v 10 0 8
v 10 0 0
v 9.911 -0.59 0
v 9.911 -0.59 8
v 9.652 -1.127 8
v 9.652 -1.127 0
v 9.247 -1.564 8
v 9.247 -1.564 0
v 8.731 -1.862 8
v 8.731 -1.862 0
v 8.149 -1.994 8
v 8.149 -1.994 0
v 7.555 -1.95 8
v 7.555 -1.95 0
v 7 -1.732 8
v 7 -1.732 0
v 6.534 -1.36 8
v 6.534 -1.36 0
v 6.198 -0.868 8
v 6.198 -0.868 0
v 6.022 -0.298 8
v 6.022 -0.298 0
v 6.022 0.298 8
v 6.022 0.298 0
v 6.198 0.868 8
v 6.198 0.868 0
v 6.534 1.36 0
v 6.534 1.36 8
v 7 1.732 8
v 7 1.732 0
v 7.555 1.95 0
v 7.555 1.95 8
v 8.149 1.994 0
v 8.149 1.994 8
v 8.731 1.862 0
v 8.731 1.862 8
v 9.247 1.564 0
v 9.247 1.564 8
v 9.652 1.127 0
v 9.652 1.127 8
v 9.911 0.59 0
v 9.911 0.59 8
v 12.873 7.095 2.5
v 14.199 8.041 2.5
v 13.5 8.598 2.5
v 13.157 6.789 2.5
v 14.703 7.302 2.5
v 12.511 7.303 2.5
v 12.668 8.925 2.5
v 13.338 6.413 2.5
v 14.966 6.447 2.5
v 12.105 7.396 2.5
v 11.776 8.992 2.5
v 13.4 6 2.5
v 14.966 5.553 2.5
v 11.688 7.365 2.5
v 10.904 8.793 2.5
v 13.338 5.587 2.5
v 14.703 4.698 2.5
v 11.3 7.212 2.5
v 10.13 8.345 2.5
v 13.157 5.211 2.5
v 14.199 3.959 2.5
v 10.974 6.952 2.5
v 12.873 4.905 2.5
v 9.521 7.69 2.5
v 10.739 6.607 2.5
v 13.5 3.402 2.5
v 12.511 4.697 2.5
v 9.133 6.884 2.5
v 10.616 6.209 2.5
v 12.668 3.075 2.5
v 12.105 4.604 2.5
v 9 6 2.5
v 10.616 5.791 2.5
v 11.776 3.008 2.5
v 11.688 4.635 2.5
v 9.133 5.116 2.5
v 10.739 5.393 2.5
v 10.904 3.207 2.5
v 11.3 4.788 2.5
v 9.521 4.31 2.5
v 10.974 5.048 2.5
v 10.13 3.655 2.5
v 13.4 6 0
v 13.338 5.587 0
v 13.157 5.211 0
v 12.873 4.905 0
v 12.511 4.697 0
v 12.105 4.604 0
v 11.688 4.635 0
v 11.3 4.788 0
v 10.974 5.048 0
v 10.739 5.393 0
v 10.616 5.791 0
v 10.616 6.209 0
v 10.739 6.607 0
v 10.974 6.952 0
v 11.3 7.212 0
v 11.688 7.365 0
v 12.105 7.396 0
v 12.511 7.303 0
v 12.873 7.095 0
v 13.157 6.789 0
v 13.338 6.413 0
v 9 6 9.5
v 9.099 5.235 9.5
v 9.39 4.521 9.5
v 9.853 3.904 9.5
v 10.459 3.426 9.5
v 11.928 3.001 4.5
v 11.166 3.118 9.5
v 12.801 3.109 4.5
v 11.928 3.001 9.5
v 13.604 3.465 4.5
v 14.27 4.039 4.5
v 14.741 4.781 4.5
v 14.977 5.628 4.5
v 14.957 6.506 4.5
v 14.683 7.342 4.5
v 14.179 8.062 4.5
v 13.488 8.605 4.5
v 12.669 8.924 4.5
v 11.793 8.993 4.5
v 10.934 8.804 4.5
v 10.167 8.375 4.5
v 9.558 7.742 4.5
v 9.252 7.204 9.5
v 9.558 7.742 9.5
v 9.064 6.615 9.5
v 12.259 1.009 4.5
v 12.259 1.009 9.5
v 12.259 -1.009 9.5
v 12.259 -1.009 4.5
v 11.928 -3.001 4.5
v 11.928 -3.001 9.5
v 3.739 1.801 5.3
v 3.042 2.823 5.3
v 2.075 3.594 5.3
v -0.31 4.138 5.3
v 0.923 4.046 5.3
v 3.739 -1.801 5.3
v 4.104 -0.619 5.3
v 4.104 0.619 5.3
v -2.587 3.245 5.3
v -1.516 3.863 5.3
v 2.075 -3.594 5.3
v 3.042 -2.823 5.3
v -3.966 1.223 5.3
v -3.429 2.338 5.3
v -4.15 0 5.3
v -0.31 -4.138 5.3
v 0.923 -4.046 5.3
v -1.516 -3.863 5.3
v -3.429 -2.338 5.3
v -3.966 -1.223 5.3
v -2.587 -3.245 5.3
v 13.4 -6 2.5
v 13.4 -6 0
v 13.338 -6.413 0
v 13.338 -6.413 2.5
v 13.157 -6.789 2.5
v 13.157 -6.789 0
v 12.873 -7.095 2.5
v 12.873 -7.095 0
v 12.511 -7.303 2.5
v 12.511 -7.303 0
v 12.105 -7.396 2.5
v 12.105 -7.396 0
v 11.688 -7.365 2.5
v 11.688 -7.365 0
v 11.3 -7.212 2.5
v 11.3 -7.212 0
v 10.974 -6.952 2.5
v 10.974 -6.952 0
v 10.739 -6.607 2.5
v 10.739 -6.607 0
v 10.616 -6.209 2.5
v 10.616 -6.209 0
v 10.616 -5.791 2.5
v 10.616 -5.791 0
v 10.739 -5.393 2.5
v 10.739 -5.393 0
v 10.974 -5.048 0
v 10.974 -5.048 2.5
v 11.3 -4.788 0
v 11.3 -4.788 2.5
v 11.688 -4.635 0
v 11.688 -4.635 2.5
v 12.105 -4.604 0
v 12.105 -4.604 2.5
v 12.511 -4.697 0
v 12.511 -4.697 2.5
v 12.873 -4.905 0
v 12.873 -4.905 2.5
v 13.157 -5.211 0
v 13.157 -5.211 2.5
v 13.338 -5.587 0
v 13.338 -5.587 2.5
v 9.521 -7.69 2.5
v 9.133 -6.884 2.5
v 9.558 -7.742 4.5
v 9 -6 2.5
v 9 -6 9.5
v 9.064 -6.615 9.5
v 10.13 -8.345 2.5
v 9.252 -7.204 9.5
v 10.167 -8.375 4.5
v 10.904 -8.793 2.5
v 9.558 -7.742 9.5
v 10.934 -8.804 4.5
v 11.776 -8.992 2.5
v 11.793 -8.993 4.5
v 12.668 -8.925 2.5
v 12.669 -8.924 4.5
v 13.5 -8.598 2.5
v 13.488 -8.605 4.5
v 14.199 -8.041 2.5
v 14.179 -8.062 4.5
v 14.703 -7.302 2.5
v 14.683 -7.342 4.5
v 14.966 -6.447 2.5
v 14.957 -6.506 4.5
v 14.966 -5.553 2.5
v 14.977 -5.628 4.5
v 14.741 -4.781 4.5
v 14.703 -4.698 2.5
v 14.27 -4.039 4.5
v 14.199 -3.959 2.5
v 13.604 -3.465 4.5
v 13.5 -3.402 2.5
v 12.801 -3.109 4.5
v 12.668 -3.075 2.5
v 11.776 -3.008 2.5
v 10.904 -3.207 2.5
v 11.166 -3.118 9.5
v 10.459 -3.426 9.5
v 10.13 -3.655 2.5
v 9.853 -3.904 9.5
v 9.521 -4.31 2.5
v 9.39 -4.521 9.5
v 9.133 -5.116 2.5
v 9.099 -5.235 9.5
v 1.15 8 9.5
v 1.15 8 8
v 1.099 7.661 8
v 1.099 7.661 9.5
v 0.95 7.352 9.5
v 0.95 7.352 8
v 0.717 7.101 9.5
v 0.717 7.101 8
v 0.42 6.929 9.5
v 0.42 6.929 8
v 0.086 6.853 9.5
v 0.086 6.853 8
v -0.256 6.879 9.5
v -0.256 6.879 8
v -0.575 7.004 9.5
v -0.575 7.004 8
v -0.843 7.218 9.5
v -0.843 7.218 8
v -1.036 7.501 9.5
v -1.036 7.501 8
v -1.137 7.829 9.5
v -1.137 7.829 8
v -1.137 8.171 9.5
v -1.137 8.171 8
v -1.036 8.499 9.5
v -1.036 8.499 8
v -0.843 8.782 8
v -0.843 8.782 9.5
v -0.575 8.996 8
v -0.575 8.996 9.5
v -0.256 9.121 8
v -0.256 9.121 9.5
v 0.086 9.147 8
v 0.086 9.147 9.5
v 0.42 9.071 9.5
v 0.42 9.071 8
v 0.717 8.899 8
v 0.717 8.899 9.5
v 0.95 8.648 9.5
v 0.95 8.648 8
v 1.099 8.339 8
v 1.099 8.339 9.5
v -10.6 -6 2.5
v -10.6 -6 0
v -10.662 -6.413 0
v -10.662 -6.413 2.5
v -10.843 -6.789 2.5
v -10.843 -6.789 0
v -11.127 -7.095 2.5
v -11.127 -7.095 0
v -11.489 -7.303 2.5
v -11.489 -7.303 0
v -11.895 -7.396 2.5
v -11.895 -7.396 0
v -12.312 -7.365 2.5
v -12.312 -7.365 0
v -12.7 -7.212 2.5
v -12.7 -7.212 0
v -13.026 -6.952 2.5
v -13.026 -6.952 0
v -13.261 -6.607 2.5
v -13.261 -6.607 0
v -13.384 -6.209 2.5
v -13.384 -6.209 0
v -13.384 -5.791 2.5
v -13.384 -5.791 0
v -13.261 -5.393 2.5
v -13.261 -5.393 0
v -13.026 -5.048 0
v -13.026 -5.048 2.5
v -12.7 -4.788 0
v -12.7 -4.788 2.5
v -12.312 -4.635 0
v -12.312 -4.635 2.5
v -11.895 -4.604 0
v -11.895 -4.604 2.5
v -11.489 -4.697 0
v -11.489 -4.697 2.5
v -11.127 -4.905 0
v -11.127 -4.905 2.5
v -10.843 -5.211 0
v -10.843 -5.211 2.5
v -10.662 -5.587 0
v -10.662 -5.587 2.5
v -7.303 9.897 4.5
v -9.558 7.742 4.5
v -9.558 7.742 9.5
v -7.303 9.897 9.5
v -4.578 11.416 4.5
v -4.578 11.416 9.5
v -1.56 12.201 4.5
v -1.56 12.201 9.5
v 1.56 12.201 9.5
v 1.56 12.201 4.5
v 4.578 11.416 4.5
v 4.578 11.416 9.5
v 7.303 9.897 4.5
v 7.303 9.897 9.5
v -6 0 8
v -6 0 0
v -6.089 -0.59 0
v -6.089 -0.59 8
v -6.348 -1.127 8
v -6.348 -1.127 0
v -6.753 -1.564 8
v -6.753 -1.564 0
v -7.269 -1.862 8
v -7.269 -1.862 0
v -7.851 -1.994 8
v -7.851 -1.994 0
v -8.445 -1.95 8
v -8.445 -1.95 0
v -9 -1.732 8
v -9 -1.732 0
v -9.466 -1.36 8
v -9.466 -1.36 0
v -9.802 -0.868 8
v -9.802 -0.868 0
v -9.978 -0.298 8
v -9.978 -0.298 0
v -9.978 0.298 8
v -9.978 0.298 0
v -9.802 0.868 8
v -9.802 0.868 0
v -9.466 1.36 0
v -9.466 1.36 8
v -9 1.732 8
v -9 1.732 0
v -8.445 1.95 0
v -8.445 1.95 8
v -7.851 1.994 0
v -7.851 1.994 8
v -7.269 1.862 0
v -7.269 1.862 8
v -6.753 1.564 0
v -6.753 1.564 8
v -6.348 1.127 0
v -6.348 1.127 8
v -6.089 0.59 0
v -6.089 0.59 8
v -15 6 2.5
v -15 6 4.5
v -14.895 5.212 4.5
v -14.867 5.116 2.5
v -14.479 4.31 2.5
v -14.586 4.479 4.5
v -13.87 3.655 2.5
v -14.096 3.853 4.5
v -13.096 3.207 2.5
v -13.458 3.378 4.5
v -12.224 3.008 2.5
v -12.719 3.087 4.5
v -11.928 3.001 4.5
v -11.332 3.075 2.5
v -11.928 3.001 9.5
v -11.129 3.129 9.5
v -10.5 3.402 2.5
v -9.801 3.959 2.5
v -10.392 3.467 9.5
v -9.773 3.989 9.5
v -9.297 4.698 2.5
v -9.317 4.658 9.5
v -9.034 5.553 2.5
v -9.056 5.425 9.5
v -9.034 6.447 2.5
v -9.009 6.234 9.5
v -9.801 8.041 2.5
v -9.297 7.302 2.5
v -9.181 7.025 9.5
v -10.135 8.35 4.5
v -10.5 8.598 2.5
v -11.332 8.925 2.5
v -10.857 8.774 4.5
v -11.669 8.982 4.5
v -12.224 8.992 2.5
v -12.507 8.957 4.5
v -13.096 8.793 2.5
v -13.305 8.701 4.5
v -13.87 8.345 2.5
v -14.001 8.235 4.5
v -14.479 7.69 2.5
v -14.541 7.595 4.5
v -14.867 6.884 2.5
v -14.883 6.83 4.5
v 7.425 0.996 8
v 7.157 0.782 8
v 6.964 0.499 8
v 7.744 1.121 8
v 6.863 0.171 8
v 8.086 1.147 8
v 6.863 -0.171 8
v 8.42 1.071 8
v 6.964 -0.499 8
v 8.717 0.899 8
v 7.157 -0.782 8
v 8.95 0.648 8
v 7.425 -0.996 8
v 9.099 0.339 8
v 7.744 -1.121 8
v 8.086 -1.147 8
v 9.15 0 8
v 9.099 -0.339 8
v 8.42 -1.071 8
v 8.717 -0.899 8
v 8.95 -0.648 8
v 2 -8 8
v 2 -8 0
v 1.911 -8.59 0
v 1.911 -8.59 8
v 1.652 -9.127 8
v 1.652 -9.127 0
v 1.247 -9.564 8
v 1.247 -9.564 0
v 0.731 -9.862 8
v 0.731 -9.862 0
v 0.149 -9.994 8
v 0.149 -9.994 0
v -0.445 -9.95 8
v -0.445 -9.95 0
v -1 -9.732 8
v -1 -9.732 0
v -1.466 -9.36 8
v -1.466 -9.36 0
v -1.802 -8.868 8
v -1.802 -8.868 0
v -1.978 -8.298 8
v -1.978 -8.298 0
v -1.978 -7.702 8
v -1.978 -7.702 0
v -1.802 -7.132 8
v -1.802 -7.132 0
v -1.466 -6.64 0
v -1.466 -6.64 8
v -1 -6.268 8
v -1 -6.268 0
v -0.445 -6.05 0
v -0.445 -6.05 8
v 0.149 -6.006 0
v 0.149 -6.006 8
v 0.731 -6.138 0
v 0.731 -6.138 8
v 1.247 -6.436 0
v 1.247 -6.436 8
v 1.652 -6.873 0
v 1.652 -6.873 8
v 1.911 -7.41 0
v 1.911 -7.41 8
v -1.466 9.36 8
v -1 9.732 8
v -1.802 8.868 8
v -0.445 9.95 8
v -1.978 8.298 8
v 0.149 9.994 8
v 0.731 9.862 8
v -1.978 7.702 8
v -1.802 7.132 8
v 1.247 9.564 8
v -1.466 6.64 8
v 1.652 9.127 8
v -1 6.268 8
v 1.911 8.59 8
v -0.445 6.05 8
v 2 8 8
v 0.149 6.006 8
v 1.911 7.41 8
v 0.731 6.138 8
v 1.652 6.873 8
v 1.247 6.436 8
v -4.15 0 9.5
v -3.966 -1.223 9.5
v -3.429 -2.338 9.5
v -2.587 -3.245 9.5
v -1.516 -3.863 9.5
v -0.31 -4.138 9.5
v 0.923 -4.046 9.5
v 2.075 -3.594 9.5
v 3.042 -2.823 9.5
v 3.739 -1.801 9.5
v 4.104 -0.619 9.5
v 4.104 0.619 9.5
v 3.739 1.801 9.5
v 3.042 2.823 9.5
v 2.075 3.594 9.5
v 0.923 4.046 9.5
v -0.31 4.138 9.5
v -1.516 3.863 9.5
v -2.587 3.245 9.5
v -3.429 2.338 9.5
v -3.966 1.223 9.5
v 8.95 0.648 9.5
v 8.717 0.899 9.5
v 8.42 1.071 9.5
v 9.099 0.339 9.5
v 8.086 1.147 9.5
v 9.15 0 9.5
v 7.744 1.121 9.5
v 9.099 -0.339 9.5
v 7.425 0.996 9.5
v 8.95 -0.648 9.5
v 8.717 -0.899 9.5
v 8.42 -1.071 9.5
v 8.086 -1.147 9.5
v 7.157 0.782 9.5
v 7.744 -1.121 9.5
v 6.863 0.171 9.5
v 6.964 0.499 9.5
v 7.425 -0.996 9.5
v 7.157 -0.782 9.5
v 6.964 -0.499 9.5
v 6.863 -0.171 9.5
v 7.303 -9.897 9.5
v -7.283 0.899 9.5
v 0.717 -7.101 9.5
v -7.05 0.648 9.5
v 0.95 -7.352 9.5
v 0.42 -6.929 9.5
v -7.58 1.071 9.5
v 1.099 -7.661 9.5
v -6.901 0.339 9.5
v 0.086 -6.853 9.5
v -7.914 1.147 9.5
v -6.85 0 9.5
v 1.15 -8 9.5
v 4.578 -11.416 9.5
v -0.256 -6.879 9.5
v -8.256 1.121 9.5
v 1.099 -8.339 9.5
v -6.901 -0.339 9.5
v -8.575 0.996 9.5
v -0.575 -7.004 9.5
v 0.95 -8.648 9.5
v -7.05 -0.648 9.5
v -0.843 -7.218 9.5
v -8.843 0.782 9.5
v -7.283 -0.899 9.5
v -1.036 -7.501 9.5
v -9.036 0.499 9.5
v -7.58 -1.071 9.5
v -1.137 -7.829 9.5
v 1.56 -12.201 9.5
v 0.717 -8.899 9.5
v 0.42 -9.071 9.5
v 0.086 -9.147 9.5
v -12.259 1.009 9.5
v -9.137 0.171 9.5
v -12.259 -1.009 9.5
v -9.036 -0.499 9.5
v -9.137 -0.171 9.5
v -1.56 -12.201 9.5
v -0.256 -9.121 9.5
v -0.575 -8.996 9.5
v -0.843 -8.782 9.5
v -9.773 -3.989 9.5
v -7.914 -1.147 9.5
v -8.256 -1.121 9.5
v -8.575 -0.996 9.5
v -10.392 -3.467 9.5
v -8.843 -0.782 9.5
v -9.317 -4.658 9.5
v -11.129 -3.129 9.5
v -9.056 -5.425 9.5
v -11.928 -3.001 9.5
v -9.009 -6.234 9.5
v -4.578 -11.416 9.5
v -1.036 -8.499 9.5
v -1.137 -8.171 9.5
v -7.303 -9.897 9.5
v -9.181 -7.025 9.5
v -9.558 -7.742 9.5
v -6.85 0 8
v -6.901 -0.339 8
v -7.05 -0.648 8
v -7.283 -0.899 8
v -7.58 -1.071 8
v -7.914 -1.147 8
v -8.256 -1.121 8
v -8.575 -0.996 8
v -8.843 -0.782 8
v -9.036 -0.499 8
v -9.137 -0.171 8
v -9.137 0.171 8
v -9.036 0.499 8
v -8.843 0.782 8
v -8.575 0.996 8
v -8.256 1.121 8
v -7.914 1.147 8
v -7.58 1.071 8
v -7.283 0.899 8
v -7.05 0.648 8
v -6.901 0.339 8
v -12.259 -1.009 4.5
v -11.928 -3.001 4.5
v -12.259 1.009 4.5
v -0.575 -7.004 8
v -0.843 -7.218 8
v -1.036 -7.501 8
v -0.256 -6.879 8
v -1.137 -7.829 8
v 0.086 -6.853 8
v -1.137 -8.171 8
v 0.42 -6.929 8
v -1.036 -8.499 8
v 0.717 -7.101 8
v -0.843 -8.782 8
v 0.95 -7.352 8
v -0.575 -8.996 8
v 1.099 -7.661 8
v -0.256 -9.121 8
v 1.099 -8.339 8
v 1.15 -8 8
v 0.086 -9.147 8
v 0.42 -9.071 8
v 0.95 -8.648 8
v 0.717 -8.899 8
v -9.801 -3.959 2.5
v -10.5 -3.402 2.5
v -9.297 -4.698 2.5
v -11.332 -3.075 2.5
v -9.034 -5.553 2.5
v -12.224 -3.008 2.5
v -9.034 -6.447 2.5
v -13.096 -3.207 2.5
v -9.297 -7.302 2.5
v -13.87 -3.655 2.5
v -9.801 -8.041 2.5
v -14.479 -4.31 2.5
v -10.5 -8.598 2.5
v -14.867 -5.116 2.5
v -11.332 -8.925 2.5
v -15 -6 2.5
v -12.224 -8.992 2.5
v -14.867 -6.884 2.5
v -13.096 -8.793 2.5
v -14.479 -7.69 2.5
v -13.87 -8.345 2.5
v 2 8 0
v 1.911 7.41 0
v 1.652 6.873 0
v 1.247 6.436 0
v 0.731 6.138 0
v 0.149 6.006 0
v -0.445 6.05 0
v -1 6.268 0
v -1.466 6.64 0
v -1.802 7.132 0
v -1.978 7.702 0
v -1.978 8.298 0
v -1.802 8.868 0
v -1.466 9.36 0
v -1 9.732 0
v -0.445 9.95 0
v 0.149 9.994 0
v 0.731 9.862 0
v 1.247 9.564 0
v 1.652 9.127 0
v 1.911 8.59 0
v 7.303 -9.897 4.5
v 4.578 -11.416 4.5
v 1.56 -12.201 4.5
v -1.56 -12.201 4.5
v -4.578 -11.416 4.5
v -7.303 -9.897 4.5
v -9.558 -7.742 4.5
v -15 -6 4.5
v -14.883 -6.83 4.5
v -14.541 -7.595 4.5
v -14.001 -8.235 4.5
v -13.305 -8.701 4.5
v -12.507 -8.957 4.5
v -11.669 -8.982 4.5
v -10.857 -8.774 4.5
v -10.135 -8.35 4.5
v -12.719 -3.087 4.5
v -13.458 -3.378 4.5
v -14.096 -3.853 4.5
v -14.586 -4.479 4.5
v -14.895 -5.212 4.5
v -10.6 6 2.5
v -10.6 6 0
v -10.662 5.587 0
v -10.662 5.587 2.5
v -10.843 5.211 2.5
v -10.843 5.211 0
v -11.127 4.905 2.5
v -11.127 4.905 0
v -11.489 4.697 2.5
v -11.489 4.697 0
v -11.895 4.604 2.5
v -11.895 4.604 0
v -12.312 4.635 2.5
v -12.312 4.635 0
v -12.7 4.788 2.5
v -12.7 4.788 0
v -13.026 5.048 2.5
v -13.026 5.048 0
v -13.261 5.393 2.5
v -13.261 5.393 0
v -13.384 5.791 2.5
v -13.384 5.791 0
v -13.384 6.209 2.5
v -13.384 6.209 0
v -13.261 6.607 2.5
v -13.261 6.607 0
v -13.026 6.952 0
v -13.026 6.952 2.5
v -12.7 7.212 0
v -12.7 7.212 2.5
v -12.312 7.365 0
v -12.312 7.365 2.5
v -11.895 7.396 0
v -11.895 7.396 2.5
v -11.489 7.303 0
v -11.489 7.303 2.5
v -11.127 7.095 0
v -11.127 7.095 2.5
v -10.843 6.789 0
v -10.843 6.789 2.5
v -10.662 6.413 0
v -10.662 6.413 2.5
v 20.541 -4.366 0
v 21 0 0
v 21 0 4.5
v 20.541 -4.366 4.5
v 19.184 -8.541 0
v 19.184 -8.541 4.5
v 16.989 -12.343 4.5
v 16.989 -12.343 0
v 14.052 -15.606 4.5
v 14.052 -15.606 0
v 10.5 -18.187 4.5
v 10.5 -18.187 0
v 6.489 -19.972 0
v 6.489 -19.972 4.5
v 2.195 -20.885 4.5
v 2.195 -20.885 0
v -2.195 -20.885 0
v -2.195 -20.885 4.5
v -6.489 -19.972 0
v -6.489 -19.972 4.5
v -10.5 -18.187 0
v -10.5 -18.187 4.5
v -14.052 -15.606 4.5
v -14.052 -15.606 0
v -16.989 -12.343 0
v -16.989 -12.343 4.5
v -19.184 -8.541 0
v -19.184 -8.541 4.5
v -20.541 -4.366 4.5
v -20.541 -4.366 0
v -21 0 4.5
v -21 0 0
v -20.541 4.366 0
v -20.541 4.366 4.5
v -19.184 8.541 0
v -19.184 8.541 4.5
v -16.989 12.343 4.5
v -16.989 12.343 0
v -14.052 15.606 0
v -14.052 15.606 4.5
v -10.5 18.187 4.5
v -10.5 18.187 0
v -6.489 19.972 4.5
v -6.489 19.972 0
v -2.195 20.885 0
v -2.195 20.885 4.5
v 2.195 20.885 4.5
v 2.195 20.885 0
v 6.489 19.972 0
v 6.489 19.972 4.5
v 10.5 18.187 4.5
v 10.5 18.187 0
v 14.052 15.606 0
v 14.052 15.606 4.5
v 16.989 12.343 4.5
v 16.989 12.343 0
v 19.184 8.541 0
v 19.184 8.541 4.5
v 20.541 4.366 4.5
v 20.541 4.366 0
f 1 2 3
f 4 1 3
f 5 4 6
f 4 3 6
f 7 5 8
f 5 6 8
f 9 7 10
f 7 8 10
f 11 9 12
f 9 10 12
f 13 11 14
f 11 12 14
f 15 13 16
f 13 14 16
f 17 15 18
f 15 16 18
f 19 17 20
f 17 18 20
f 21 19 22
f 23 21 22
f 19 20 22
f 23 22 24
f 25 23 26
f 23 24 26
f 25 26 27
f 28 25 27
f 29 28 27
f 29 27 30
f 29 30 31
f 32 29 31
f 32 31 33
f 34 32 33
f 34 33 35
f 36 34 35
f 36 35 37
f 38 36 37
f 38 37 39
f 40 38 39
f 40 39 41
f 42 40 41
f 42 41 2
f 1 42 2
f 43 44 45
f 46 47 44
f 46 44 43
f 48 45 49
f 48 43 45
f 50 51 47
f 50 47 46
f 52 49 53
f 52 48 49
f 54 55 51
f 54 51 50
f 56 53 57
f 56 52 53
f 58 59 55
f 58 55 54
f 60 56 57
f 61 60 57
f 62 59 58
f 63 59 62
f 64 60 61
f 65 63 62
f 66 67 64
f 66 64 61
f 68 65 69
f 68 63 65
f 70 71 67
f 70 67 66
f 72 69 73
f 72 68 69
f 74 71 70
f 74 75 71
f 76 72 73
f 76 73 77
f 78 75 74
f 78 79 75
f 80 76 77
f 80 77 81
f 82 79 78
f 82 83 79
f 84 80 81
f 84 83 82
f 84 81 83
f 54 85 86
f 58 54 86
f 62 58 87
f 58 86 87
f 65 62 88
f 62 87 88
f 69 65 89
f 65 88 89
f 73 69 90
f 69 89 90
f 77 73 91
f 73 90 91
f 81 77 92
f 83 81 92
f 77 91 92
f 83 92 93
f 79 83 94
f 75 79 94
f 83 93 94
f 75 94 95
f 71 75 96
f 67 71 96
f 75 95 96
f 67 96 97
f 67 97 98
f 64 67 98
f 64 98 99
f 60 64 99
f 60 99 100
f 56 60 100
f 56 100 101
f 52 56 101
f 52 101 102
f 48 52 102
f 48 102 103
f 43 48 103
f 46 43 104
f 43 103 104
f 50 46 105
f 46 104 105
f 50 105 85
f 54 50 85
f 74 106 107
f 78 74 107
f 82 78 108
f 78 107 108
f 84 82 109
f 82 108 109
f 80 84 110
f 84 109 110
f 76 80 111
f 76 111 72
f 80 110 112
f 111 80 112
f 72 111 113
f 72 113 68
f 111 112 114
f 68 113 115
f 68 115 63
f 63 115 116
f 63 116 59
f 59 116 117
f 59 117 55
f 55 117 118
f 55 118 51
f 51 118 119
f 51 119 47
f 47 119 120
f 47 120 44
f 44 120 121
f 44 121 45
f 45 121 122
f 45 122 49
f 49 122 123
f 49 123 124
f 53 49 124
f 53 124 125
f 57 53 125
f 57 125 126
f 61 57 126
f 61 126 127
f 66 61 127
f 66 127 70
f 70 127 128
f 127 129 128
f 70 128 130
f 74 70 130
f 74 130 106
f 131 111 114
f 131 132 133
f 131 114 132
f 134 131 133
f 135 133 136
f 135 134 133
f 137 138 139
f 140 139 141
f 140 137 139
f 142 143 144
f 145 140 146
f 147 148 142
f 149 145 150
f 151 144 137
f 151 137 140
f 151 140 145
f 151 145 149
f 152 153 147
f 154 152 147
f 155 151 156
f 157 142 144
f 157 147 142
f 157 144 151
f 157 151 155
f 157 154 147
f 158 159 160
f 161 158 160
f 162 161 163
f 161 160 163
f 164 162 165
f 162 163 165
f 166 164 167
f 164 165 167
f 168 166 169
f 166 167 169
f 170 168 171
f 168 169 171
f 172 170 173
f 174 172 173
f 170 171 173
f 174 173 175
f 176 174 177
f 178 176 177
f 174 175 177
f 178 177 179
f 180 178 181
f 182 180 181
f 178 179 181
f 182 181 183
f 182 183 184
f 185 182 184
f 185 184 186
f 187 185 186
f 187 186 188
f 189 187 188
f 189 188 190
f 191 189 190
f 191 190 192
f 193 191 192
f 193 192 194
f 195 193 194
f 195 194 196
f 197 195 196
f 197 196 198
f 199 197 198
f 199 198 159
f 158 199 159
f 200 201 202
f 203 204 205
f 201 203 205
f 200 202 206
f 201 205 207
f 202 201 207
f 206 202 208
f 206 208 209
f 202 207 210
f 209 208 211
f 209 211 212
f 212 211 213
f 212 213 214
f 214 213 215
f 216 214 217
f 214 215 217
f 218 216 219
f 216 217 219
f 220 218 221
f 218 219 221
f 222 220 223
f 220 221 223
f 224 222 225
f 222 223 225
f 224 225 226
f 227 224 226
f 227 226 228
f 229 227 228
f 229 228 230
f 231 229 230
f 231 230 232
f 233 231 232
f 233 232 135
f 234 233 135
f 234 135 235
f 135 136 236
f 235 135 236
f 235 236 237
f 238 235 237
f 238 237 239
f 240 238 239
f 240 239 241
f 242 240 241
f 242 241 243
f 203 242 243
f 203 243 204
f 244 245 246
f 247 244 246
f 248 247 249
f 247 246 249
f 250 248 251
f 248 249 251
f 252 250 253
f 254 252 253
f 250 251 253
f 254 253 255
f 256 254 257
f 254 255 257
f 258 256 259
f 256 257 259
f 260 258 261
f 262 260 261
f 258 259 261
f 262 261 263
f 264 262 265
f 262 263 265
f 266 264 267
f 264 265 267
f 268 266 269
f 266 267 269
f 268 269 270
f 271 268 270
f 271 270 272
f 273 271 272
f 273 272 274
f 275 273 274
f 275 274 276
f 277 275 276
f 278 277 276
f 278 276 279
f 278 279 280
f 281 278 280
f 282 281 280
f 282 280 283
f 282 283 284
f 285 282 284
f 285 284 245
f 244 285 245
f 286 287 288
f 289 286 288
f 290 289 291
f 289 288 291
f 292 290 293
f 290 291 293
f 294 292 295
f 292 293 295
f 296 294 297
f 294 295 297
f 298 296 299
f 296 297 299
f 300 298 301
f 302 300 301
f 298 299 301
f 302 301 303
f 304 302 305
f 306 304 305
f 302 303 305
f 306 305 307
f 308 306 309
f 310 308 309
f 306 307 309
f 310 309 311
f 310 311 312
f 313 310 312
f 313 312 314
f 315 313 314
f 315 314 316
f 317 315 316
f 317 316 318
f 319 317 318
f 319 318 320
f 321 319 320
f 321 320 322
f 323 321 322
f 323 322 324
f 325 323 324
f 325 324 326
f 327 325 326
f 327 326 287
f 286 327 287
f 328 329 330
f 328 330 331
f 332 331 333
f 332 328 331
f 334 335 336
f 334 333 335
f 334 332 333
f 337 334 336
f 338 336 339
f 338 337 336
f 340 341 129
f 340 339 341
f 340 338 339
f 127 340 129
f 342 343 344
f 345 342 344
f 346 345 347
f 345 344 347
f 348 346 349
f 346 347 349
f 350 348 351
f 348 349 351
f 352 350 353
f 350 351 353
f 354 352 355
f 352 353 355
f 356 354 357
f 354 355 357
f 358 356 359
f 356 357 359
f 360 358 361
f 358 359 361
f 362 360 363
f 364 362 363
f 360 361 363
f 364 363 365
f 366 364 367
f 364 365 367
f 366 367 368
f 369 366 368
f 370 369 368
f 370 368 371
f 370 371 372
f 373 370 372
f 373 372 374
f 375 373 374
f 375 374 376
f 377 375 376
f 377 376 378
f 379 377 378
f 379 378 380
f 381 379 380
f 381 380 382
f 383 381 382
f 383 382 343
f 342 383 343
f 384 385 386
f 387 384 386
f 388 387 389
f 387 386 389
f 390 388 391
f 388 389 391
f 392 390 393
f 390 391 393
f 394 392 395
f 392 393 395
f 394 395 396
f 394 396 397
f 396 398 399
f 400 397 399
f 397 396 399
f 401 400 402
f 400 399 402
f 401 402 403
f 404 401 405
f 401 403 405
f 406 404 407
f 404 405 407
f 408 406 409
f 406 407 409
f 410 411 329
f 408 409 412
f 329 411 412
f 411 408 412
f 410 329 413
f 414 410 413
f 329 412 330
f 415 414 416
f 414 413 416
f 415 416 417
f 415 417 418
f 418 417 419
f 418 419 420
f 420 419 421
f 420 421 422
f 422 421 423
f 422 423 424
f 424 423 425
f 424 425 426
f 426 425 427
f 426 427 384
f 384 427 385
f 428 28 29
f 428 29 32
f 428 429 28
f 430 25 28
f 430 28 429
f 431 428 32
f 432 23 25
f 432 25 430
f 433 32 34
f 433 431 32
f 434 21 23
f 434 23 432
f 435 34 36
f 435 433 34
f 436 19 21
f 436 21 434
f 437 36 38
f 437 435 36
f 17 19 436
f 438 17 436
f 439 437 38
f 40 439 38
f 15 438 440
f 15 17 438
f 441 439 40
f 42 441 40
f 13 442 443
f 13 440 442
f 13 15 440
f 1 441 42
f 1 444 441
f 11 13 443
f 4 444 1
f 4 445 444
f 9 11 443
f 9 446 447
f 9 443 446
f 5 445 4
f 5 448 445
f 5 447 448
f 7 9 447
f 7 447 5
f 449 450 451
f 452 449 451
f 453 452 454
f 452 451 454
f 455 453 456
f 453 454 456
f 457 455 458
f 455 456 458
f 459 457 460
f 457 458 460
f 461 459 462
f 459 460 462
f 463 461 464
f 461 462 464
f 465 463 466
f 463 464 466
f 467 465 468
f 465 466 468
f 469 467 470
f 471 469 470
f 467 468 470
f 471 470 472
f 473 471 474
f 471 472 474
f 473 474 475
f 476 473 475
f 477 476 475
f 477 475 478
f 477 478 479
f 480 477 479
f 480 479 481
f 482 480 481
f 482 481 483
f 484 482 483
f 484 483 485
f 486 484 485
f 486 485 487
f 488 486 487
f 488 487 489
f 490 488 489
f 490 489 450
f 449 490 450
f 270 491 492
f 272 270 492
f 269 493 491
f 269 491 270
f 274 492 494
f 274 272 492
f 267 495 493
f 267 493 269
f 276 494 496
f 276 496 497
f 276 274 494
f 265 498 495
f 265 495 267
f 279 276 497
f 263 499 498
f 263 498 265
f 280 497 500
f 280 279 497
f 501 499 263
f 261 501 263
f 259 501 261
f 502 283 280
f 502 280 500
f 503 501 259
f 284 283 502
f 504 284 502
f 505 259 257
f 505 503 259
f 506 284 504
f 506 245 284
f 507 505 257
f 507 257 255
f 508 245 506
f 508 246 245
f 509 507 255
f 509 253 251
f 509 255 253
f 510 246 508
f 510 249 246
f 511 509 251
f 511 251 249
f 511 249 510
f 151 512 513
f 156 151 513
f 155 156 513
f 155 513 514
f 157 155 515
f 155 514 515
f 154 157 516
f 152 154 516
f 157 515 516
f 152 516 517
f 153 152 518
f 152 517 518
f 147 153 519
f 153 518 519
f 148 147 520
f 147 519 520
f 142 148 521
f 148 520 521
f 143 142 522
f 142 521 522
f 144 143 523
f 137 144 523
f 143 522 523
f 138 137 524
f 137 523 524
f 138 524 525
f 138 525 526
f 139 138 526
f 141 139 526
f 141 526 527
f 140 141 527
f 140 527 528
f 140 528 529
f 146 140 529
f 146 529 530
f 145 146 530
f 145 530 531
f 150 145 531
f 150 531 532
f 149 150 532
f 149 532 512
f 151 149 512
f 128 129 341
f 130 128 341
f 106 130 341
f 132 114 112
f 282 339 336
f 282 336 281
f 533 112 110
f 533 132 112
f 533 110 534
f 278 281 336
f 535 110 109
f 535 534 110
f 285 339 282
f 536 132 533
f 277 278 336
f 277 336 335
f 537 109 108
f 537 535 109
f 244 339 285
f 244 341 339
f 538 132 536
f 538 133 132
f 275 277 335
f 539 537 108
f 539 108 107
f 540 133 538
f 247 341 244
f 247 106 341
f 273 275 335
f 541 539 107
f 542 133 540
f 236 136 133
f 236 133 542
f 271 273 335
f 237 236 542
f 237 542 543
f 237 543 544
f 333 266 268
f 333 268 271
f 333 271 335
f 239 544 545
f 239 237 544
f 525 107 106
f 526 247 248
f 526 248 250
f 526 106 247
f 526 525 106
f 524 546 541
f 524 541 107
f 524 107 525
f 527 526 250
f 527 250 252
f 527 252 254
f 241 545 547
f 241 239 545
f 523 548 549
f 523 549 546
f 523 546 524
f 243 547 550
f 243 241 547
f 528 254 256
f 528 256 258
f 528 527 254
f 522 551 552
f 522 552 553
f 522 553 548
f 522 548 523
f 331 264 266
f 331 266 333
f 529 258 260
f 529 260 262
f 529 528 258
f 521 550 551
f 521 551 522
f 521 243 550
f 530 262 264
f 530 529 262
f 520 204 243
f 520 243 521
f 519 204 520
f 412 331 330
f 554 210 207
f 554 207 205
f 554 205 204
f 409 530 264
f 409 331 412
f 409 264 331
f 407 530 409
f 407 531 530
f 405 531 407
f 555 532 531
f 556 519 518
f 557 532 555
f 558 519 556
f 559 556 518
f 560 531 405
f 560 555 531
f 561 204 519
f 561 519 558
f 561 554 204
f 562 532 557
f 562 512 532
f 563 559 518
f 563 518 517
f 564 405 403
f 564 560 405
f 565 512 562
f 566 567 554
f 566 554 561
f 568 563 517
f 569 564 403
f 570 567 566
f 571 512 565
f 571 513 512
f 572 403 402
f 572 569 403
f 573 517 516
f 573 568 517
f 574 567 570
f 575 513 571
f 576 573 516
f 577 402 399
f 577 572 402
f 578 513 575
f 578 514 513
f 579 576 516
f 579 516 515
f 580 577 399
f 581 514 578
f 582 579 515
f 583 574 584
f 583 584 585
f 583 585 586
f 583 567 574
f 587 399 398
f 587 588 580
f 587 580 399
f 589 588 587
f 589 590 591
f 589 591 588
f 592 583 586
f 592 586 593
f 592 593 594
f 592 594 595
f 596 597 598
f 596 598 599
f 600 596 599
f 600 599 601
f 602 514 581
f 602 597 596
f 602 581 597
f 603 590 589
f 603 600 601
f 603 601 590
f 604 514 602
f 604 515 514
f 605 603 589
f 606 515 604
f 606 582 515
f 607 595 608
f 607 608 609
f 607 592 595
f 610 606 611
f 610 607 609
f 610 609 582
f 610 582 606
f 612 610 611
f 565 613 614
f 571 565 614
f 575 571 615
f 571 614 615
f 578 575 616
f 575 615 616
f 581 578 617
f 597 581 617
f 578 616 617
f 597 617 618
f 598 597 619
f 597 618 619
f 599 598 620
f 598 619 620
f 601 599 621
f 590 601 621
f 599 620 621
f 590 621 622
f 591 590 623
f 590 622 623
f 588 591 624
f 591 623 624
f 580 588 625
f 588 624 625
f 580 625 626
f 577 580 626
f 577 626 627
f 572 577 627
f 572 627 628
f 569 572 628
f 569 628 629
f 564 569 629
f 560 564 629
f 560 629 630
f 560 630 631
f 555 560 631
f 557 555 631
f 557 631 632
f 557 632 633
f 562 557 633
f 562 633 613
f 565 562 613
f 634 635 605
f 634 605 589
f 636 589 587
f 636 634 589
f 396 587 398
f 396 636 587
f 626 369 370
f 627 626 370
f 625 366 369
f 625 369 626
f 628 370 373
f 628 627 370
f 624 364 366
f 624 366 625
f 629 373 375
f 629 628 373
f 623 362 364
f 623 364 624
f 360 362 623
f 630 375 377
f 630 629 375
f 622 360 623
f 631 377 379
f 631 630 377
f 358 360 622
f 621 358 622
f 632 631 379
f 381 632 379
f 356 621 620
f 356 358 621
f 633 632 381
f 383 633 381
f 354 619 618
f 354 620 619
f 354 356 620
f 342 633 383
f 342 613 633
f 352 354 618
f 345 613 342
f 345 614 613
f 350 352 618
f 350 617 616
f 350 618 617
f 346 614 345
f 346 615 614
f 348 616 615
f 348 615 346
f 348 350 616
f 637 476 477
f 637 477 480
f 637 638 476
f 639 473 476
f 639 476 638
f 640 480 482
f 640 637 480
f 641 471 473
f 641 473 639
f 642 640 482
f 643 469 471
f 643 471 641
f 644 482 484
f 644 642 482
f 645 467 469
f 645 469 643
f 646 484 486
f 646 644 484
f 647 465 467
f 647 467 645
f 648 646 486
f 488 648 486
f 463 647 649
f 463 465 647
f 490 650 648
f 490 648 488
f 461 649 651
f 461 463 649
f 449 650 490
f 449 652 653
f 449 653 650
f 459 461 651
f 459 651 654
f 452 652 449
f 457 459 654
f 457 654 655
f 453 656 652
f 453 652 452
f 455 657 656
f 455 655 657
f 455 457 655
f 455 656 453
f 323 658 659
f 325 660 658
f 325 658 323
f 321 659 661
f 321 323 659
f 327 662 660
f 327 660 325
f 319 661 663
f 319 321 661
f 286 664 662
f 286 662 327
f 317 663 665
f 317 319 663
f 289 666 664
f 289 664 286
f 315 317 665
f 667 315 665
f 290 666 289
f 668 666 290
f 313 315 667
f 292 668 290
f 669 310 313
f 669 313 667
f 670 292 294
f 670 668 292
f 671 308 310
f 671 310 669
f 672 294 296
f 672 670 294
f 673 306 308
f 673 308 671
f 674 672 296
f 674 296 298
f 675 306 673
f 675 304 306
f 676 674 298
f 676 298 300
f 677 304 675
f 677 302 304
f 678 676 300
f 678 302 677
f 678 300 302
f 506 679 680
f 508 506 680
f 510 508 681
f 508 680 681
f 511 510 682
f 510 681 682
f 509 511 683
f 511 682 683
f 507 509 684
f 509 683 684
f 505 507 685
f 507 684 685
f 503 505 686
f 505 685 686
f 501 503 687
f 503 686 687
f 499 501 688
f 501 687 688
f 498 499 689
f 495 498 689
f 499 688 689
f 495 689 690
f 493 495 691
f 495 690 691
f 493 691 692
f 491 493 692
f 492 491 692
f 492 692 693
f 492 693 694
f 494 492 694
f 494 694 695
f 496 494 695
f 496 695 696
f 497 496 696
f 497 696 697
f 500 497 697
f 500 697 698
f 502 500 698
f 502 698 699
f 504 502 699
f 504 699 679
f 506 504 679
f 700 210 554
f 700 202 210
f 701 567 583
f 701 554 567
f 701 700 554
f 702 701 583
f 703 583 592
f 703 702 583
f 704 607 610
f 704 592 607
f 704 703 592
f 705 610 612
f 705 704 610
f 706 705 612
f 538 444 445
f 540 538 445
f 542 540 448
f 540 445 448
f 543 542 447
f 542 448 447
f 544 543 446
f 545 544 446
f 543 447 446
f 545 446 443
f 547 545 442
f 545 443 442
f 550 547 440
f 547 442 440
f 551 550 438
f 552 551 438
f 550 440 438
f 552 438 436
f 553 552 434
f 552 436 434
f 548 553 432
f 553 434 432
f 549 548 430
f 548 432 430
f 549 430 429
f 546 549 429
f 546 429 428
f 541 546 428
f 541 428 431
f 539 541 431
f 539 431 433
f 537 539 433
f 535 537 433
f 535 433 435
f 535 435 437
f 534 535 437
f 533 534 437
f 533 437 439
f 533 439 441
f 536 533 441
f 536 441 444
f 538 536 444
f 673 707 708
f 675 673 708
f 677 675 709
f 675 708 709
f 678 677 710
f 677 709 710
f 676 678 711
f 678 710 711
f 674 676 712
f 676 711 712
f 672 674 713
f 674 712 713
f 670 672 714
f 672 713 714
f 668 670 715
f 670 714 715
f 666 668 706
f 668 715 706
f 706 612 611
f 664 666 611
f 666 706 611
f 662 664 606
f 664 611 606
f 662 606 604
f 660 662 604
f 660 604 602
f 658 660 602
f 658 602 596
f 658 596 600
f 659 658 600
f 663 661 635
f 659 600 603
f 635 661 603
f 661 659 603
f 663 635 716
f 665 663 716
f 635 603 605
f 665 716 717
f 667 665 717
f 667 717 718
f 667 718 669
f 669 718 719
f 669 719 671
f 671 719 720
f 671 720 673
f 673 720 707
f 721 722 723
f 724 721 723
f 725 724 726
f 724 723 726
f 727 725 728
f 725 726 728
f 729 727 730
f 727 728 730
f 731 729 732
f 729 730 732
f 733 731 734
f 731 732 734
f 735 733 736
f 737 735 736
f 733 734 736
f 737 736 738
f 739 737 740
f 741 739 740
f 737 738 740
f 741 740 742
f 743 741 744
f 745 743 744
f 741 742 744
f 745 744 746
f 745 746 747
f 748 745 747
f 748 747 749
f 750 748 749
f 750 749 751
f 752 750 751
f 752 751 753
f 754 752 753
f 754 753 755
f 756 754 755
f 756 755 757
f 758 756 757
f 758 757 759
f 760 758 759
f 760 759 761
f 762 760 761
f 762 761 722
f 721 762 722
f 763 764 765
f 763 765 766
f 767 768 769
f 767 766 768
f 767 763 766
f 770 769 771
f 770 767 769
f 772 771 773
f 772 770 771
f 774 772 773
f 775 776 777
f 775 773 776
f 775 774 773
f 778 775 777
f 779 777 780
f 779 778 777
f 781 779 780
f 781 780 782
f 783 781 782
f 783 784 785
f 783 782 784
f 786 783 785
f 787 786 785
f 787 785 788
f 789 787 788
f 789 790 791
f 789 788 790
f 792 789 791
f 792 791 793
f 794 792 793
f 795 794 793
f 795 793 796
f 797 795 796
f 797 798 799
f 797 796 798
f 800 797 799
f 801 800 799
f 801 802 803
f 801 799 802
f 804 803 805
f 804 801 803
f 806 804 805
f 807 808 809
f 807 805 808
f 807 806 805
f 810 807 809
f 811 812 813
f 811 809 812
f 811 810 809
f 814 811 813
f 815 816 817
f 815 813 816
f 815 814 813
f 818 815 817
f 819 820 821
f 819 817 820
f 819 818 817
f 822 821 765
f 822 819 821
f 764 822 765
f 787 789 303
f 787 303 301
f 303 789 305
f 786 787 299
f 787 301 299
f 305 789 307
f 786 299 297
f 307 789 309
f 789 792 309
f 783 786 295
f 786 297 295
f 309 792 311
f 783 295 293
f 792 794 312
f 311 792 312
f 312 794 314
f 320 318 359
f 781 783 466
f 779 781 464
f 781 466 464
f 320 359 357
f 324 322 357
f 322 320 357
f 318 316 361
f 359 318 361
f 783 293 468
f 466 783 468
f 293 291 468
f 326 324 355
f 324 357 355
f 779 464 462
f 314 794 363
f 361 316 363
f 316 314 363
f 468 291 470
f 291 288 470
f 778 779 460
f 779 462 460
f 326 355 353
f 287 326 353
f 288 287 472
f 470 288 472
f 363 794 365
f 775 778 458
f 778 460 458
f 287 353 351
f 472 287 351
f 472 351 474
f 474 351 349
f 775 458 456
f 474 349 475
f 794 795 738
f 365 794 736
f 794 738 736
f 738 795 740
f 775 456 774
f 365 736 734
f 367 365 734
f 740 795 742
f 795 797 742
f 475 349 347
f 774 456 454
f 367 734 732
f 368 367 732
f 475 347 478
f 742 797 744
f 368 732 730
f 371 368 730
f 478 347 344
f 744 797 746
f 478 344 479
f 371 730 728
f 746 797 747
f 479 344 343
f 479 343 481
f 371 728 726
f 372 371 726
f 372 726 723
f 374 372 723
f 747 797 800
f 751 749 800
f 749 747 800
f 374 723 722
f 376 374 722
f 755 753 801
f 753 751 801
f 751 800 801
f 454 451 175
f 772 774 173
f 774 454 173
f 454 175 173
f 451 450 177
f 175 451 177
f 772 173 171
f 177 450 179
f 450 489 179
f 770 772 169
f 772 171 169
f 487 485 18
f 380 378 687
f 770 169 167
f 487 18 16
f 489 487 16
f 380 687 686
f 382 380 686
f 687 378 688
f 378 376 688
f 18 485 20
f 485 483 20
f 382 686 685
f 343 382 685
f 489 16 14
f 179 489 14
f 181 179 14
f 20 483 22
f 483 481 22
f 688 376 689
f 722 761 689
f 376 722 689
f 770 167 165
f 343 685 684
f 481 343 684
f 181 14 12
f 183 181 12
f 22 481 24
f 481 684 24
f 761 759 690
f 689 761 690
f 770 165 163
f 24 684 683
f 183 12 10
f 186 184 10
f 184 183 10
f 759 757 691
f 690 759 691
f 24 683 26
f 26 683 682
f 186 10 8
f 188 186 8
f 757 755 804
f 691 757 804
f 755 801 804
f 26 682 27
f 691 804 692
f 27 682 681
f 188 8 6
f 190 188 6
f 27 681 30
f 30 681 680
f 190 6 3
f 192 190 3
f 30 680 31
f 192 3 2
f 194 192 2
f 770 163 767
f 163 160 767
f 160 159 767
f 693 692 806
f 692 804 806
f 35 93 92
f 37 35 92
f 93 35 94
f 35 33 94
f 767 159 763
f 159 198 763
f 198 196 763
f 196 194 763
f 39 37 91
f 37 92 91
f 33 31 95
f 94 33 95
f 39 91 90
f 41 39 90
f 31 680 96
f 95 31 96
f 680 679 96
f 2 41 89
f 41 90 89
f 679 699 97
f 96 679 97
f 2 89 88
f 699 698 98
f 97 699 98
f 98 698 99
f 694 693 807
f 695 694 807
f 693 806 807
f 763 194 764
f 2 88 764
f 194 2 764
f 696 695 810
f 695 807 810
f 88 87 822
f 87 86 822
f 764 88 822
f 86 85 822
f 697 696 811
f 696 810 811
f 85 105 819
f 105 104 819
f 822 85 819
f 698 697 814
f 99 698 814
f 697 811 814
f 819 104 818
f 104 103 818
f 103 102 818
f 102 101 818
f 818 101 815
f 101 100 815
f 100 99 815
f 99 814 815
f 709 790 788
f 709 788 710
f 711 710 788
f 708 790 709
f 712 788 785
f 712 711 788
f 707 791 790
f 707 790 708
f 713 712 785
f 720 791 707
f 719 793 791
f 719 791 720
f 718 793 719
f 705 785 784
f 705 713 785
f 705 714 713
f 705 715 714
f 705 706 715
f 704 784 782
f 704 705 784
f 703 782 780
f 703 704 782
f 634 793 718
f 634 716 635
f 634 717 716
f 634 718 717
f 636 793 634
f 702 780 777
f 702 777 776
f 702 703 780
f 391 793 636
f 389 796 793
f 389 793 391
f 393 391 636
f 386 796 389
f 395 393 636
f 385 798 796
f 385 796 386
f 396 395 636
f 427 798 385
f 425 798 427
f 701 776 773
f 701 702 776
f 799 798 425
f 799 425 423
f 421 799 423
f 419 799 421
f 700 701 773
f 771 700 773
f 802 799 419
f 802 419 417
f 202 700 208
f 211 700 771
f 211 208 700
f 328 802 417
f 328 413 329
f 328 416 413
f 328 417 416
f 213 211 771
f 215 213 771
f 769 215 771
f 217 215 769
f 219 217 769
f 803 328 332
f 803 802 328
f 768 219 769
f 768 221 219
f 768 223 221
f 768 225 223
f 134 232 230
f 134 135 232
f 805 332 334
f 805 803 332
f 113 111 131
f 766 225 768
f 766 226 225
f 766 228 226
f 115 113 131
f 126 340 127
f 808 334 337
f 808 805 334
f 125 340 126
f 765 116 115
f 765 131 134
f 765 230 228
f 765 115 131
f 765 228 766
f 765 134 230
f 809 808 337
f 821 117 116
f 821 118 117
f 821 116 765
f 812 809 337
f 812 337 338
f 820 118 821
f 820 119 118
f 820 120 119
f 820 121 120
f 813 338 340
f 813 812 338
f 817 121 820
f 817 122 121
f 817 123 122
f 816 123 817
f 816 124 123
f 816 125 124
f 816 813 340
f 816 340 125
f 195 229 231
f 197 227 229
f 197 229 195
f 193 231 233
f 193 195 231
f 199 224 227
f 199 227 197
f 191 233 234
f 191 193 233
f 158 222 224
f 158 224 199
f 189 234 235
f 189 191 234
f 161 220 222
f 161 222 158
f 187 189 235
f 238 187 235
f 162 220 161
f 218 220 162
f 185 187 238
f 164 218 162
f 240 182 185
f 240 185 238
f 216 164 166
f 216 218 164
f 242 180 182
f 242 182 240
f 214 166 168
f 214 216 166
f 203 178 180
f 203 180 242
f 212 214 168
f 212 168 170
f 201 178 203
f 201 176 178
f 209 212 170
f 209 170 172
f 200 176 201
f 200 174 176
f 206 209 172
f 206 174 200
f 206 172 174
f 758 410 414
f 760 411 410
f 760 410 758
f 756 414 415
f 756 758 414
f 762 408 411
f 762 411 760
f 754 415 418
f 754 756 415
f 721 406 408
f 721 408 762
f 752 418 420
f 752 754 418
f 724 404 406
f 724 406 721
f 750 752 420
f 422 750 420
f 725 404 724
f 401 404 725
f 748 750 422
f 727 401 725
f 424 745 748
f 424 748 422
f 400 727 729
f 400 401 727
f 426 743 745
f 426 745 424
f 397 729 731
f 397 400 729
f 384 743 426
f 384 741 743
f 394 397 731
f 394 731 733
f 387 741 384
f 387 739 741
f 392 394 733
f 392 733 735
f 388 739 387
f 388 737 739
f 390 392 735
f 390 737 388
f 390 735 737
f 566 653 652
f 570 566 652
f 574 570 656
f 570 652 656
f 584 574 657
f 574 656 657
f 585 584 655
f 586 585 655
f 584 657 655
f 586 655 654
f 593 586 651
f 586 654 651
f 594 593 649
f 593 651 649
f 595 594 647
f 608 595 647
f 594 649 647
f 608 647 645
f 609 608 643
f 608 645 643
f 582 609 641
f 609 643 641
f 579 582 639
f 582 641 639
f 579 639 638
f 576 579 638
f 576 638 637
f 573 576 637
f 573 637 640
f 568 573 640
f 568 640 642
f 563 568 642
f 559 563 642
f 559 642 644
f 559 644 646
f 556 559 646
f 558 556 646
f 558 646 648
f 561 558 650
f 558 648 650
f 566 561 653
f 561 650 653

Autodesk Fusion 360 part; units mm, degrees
sketch "スケッチ1" plane through (0, 0, 0) normal (0, 0, 1) x (1, 0, 0)
  circle A0 centre (0, 0) radius 21
  dimension "d1" = 42
extrude "押し出し1" add sketch "スケッチ1" along normal blind 4.5
sketch "スケッチ2" plane through (0, 0, 4.5) normal (0, 0, 1) x (-1, 0, 0)
  circle A0 centre (0, 0) radius 21
  circle A1 centre (0, 0) radius 12.3
  dimension "d4" = 24.6
extrude "押し出し2" add sketch "スケッチ2" along normal blind 5 contours A1
sketch "スケッチ3" plane through (0, 0, 9.5) normal (0, 0, 1) x (-1, 0, 0)
  circle A0 centre (0, 0) radius 4.15
  dimension "d7" = 8.3
extrude "押し出し3" cut sketch "スケッチ3" against normal blind 4.2
sketch "スケッチ4" plane through (0, 0, 0) normal (0, 0, -1) x (1, 0, 0)
  circle A0 centre (0, 0) radius 21
  circle A1 centre (0, 0) radius 8
  circle A2 centre (0, -8) radius 1.15
  circle A3 centre (8, 0) radius 1.15
  circle A4 centre (0, 8) radius 1.15
  circle A5 centre (-8, 0) radius 1.15
  dimension "d10" = 16
  dimension "d11" = 2.3
  dimension "d12" = 2.3
  dimension "d13" = 2.3
  dimension "d14" = 2.3
extrude "押し出し4" cut sketch "スケッチ4" against normal through all contours A1 A3 | A1 A3 | A1 A4 | A1 A4 | A1 A2 | A1 A2 | A1 A5 | A1 A5
sketch "スケッチ5" plane through (0, 0, 0) normal (0, 0, -1) x (1, 0, 0)
  circle A0 centre (8, 0) radius 1.15
  circle A1 centre (0, 8) radius 1.15
  circle A2 centre (0, -8) radius 1.15
  circle A3 centre (-8, 0) radius 1.15
  circle A4 centre (0, 0) radius 21
  line L0 (12, -6) -> (-12, -6)
  line L1 (-12, -6) -> (-12, 6)
  line L2 (-12, 6) -> (12, 6)
  line L3 (12, 6) -> (12, -6)
  circle A5 centre (12, -6) radius 1.4
  circle A6 centre (-12, -6) radius 1.4
  circle A7 centre (12, 6) radius 1.4
  circle A8 centre (-12, 6) radius 1.4
  dimension "d16" = 24
  dimension "d17" = 12
  dimension "d18" = 12
  dimension "d19" = 6
  dimension "d20" = 2.8
  dimension "d21" = 2.8
  dimension "d22" = 2.8
  dimension "d23" = 2.8
extrude "押し出し5" cut sketch "スケッチ5" against normal through all contours L0 L1 A6 | L0 L1 A6 | L0 L3 A5 | L0 L3 A5 | L1 L2 A8 | L1 L2 A8 | L2 L3 A7 | L2 L3 A7
sketch "スケッチ6" plane through (0, 0, 0) normal (0, 0, -1) x (1, 0, 0)
  circle A0 centre (0, 0) radius 21
  circle A1 centre (-8, 0) radius 1.15
  circle A2 centre (0, -8) radius 1.15
  circle A3 centre (0, 8) radius 1.15
  circle A4 centre (8, 0) radius 1.15
  circle A5 centre (-12, 6) radius 1.4
  circle A6 centre (12, -6) radius 1.4
  circle A7 centre (-12, -6) radius 1.4
  circle A8 centre (12, 6) radius 1.4
  circle A9 centre (0, -8) radius 2
  circle A10 centre (8, 0) radius 2
  circle A11 centre (-8, 0) radius 2
  circle A12 centre (0, 8) radius 2
  dimension "d25" = 4
  dimension "d26" = 4
  dimension "d27" = 4
  dimension "d28" = 4
extrude "押し出し6" cut sketch "スケッチ6" against normal blind 8 contours A9 | A10 | A11 | A12
sketch "スケッチ7" plane through (0, 0, 9.5) normal (0, 0, 1) x (-1, 0, 0)
  arc A0 (-11.3392, 4.7658) -> (-10.6161, 6.2119) centre (-12, 6) ccw
  arc A1 (-11.3392, 4.7658) -> (-11.3392, -4.7658) centre (0, 0) ccw
  arc A2 (-10.6161, -6.2119) -> (-11.3392, -4.7658) centre (-12, -6) ccw
  arc A3 (-10.6161, -6.2119) -> (10.6161, -6.2119) centre (0, 0) ccw
  arc A4 (11.3392, -4.7658) -> (10.6161, -6.2119) centre (12, -6) ccw
  arc A5 (11.3392, -4.7658) -> (11.3392, 4.7658) centre (0, 0) ccw
  arc A6 (10.6161, 6.2119) -> (11.3392, 4.7658) centre (12, 6) ccw
  arc A7 (10.6161, 6.2119) -> (-10.6161, 6.2119) centre (0, 0) ccw
  circle A8 centre (-8, 0) radius 1.15
  circle A9 centre (0, 8) radius 1.15
  circle A10 centre (0, -8) radius 1.15
  circle A11 centre (8, 0) radius 1.15
  circle A12 centre (0, 0) radius 4.15
  circle A13 centre (-12, 6) radius 3
  circle A14 centre (-12, -6) radius 3
  circle A15 centre (12, 6) radius 3
  circle A16 centre (12, -6) radius 3
  dimension "d31" = 6
  dimension "d32" = 6
  dimension "d33" = 6
  dimension "d34" = 6
extrude "押し出し7" cut sketch "スケッチ7" against normal blind 7 contours A0 A1 A7 A13 | A0 A1 A7 A13 | A1 A2 A3 A14 | A1 A2 A3 A14 | A5 A6 A7 A15 | A5 A6 A7 A15 | A3 A4 A5 A16 | A3 A4 A5 A16
equation "d18 = d16 / 2"
equation "d19 = d17 / 2"
